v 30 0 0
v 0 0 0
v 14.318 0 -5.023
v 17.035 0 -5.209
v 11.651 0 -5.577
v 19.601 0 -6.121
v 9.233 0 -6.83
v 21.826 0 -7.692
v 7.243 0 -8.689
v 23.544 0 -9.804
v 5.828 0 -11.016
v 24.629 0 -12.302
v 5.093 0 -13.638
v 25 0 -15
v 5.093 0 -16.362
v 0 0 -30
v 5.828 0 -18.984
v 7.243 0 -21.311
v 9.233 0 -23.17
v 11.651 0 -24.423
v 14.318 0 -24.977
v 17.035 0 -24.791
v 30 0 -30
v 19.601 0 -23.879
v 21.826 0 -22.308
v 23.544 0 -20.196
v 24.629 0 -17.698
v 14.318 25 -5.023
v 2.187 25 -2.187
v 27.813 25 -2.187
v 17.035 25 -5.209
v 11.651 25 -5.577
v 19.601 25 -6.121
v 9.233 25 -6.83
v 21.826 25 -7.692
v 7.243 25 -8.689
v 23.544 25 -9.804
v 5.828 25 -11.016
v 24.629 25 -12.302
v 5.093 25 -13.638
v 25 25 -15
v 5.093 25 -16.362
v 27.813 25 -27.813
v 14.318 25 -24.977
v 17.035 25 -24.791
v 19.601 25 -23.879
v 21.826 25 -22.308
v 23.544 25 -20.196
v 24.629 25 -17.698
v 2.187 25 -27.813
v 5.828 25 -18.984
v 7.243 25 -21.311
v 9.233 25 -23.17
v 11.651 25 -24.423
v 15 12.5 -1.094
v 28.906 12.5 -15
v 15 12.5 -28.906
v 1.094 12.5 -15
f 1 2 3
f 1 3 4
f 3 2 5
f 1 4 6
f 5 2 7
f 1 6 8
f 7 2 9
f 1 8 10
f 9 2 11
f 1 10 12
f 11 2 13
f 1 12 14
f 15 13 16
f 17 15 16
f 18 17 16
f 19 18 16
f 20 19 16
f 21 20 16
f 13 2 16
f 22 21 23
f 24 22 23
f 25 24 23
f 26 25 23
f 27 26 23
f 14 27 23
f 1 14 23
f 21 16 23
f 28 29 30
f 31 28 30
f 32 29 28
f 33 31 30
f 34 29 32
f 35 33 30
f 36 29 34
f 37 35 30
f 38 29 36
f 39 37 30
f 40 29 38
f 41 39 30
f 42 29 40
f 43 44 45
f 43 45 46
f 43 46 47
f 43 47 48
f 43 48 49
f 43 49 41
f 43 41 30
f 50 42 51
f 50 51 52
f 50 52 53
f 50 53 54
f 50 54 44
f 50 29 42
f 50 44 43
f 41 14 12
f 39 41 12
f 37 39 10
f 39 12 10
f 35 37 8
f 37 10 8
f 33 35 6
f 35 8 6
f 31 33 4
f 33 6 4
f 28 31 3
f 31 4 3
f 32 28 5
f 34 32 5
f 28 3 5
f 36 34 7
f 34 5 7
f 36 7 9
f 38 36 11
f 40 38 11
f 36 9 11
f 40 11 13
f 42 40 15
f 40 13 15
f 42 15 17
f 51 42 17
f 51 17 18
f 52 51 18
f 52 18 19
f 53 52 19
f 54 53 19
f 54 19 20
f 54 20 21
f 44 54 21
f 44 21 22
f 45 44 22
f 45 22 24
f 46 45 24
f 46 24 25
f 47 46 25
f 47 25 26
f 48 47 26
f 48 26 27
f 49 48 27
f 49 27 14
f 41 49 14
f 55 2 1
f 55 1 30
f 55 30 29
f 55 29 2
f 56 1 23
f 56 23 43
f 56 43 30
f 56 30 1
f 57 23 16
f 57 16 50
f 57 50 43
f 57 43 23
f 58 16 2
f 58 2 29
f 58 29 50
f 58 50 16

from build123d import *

# Parameters (mm, degrees)
ESQUISSE1_W             = 30
ESQUISSE1_H             = 30
EXTRUSION1_DEPTH        = 25
EXTRUSION1_TAPER        = 5
ESQUISSE2_R             = 10
ENL_V_MAT_EXTRU_1_DEPTH = 26.0000001


with BuildPart() as part:
    # Esquisse1 → Extrusion1 (new body)
    with BuildSketch(Plane(origin=(0, 0, 0), x_dir=(1, 0, 0), z_dir=(0, 1, 0))):
        with Locations((15, 15)):
            Rectangle(ESQUISSE1_W, ESQUISSE1_H)
    extrude(amount=EXTRUSION1_DEPTH, taper=EXTRUSION1_TAPER)

    # Esquisse2 → Enlèv. mat.-Extru.1 (cut, through all)
    with BuildSketch(Plane.XZ):
        with Locations((15, -15)):
            Circle(ESQUISSE2_R)
    extrude(amount=-ENL_V_MAT_EXTRU_1_DEPTH, mode=Mode.SUBTRACT)


solid = part.part
